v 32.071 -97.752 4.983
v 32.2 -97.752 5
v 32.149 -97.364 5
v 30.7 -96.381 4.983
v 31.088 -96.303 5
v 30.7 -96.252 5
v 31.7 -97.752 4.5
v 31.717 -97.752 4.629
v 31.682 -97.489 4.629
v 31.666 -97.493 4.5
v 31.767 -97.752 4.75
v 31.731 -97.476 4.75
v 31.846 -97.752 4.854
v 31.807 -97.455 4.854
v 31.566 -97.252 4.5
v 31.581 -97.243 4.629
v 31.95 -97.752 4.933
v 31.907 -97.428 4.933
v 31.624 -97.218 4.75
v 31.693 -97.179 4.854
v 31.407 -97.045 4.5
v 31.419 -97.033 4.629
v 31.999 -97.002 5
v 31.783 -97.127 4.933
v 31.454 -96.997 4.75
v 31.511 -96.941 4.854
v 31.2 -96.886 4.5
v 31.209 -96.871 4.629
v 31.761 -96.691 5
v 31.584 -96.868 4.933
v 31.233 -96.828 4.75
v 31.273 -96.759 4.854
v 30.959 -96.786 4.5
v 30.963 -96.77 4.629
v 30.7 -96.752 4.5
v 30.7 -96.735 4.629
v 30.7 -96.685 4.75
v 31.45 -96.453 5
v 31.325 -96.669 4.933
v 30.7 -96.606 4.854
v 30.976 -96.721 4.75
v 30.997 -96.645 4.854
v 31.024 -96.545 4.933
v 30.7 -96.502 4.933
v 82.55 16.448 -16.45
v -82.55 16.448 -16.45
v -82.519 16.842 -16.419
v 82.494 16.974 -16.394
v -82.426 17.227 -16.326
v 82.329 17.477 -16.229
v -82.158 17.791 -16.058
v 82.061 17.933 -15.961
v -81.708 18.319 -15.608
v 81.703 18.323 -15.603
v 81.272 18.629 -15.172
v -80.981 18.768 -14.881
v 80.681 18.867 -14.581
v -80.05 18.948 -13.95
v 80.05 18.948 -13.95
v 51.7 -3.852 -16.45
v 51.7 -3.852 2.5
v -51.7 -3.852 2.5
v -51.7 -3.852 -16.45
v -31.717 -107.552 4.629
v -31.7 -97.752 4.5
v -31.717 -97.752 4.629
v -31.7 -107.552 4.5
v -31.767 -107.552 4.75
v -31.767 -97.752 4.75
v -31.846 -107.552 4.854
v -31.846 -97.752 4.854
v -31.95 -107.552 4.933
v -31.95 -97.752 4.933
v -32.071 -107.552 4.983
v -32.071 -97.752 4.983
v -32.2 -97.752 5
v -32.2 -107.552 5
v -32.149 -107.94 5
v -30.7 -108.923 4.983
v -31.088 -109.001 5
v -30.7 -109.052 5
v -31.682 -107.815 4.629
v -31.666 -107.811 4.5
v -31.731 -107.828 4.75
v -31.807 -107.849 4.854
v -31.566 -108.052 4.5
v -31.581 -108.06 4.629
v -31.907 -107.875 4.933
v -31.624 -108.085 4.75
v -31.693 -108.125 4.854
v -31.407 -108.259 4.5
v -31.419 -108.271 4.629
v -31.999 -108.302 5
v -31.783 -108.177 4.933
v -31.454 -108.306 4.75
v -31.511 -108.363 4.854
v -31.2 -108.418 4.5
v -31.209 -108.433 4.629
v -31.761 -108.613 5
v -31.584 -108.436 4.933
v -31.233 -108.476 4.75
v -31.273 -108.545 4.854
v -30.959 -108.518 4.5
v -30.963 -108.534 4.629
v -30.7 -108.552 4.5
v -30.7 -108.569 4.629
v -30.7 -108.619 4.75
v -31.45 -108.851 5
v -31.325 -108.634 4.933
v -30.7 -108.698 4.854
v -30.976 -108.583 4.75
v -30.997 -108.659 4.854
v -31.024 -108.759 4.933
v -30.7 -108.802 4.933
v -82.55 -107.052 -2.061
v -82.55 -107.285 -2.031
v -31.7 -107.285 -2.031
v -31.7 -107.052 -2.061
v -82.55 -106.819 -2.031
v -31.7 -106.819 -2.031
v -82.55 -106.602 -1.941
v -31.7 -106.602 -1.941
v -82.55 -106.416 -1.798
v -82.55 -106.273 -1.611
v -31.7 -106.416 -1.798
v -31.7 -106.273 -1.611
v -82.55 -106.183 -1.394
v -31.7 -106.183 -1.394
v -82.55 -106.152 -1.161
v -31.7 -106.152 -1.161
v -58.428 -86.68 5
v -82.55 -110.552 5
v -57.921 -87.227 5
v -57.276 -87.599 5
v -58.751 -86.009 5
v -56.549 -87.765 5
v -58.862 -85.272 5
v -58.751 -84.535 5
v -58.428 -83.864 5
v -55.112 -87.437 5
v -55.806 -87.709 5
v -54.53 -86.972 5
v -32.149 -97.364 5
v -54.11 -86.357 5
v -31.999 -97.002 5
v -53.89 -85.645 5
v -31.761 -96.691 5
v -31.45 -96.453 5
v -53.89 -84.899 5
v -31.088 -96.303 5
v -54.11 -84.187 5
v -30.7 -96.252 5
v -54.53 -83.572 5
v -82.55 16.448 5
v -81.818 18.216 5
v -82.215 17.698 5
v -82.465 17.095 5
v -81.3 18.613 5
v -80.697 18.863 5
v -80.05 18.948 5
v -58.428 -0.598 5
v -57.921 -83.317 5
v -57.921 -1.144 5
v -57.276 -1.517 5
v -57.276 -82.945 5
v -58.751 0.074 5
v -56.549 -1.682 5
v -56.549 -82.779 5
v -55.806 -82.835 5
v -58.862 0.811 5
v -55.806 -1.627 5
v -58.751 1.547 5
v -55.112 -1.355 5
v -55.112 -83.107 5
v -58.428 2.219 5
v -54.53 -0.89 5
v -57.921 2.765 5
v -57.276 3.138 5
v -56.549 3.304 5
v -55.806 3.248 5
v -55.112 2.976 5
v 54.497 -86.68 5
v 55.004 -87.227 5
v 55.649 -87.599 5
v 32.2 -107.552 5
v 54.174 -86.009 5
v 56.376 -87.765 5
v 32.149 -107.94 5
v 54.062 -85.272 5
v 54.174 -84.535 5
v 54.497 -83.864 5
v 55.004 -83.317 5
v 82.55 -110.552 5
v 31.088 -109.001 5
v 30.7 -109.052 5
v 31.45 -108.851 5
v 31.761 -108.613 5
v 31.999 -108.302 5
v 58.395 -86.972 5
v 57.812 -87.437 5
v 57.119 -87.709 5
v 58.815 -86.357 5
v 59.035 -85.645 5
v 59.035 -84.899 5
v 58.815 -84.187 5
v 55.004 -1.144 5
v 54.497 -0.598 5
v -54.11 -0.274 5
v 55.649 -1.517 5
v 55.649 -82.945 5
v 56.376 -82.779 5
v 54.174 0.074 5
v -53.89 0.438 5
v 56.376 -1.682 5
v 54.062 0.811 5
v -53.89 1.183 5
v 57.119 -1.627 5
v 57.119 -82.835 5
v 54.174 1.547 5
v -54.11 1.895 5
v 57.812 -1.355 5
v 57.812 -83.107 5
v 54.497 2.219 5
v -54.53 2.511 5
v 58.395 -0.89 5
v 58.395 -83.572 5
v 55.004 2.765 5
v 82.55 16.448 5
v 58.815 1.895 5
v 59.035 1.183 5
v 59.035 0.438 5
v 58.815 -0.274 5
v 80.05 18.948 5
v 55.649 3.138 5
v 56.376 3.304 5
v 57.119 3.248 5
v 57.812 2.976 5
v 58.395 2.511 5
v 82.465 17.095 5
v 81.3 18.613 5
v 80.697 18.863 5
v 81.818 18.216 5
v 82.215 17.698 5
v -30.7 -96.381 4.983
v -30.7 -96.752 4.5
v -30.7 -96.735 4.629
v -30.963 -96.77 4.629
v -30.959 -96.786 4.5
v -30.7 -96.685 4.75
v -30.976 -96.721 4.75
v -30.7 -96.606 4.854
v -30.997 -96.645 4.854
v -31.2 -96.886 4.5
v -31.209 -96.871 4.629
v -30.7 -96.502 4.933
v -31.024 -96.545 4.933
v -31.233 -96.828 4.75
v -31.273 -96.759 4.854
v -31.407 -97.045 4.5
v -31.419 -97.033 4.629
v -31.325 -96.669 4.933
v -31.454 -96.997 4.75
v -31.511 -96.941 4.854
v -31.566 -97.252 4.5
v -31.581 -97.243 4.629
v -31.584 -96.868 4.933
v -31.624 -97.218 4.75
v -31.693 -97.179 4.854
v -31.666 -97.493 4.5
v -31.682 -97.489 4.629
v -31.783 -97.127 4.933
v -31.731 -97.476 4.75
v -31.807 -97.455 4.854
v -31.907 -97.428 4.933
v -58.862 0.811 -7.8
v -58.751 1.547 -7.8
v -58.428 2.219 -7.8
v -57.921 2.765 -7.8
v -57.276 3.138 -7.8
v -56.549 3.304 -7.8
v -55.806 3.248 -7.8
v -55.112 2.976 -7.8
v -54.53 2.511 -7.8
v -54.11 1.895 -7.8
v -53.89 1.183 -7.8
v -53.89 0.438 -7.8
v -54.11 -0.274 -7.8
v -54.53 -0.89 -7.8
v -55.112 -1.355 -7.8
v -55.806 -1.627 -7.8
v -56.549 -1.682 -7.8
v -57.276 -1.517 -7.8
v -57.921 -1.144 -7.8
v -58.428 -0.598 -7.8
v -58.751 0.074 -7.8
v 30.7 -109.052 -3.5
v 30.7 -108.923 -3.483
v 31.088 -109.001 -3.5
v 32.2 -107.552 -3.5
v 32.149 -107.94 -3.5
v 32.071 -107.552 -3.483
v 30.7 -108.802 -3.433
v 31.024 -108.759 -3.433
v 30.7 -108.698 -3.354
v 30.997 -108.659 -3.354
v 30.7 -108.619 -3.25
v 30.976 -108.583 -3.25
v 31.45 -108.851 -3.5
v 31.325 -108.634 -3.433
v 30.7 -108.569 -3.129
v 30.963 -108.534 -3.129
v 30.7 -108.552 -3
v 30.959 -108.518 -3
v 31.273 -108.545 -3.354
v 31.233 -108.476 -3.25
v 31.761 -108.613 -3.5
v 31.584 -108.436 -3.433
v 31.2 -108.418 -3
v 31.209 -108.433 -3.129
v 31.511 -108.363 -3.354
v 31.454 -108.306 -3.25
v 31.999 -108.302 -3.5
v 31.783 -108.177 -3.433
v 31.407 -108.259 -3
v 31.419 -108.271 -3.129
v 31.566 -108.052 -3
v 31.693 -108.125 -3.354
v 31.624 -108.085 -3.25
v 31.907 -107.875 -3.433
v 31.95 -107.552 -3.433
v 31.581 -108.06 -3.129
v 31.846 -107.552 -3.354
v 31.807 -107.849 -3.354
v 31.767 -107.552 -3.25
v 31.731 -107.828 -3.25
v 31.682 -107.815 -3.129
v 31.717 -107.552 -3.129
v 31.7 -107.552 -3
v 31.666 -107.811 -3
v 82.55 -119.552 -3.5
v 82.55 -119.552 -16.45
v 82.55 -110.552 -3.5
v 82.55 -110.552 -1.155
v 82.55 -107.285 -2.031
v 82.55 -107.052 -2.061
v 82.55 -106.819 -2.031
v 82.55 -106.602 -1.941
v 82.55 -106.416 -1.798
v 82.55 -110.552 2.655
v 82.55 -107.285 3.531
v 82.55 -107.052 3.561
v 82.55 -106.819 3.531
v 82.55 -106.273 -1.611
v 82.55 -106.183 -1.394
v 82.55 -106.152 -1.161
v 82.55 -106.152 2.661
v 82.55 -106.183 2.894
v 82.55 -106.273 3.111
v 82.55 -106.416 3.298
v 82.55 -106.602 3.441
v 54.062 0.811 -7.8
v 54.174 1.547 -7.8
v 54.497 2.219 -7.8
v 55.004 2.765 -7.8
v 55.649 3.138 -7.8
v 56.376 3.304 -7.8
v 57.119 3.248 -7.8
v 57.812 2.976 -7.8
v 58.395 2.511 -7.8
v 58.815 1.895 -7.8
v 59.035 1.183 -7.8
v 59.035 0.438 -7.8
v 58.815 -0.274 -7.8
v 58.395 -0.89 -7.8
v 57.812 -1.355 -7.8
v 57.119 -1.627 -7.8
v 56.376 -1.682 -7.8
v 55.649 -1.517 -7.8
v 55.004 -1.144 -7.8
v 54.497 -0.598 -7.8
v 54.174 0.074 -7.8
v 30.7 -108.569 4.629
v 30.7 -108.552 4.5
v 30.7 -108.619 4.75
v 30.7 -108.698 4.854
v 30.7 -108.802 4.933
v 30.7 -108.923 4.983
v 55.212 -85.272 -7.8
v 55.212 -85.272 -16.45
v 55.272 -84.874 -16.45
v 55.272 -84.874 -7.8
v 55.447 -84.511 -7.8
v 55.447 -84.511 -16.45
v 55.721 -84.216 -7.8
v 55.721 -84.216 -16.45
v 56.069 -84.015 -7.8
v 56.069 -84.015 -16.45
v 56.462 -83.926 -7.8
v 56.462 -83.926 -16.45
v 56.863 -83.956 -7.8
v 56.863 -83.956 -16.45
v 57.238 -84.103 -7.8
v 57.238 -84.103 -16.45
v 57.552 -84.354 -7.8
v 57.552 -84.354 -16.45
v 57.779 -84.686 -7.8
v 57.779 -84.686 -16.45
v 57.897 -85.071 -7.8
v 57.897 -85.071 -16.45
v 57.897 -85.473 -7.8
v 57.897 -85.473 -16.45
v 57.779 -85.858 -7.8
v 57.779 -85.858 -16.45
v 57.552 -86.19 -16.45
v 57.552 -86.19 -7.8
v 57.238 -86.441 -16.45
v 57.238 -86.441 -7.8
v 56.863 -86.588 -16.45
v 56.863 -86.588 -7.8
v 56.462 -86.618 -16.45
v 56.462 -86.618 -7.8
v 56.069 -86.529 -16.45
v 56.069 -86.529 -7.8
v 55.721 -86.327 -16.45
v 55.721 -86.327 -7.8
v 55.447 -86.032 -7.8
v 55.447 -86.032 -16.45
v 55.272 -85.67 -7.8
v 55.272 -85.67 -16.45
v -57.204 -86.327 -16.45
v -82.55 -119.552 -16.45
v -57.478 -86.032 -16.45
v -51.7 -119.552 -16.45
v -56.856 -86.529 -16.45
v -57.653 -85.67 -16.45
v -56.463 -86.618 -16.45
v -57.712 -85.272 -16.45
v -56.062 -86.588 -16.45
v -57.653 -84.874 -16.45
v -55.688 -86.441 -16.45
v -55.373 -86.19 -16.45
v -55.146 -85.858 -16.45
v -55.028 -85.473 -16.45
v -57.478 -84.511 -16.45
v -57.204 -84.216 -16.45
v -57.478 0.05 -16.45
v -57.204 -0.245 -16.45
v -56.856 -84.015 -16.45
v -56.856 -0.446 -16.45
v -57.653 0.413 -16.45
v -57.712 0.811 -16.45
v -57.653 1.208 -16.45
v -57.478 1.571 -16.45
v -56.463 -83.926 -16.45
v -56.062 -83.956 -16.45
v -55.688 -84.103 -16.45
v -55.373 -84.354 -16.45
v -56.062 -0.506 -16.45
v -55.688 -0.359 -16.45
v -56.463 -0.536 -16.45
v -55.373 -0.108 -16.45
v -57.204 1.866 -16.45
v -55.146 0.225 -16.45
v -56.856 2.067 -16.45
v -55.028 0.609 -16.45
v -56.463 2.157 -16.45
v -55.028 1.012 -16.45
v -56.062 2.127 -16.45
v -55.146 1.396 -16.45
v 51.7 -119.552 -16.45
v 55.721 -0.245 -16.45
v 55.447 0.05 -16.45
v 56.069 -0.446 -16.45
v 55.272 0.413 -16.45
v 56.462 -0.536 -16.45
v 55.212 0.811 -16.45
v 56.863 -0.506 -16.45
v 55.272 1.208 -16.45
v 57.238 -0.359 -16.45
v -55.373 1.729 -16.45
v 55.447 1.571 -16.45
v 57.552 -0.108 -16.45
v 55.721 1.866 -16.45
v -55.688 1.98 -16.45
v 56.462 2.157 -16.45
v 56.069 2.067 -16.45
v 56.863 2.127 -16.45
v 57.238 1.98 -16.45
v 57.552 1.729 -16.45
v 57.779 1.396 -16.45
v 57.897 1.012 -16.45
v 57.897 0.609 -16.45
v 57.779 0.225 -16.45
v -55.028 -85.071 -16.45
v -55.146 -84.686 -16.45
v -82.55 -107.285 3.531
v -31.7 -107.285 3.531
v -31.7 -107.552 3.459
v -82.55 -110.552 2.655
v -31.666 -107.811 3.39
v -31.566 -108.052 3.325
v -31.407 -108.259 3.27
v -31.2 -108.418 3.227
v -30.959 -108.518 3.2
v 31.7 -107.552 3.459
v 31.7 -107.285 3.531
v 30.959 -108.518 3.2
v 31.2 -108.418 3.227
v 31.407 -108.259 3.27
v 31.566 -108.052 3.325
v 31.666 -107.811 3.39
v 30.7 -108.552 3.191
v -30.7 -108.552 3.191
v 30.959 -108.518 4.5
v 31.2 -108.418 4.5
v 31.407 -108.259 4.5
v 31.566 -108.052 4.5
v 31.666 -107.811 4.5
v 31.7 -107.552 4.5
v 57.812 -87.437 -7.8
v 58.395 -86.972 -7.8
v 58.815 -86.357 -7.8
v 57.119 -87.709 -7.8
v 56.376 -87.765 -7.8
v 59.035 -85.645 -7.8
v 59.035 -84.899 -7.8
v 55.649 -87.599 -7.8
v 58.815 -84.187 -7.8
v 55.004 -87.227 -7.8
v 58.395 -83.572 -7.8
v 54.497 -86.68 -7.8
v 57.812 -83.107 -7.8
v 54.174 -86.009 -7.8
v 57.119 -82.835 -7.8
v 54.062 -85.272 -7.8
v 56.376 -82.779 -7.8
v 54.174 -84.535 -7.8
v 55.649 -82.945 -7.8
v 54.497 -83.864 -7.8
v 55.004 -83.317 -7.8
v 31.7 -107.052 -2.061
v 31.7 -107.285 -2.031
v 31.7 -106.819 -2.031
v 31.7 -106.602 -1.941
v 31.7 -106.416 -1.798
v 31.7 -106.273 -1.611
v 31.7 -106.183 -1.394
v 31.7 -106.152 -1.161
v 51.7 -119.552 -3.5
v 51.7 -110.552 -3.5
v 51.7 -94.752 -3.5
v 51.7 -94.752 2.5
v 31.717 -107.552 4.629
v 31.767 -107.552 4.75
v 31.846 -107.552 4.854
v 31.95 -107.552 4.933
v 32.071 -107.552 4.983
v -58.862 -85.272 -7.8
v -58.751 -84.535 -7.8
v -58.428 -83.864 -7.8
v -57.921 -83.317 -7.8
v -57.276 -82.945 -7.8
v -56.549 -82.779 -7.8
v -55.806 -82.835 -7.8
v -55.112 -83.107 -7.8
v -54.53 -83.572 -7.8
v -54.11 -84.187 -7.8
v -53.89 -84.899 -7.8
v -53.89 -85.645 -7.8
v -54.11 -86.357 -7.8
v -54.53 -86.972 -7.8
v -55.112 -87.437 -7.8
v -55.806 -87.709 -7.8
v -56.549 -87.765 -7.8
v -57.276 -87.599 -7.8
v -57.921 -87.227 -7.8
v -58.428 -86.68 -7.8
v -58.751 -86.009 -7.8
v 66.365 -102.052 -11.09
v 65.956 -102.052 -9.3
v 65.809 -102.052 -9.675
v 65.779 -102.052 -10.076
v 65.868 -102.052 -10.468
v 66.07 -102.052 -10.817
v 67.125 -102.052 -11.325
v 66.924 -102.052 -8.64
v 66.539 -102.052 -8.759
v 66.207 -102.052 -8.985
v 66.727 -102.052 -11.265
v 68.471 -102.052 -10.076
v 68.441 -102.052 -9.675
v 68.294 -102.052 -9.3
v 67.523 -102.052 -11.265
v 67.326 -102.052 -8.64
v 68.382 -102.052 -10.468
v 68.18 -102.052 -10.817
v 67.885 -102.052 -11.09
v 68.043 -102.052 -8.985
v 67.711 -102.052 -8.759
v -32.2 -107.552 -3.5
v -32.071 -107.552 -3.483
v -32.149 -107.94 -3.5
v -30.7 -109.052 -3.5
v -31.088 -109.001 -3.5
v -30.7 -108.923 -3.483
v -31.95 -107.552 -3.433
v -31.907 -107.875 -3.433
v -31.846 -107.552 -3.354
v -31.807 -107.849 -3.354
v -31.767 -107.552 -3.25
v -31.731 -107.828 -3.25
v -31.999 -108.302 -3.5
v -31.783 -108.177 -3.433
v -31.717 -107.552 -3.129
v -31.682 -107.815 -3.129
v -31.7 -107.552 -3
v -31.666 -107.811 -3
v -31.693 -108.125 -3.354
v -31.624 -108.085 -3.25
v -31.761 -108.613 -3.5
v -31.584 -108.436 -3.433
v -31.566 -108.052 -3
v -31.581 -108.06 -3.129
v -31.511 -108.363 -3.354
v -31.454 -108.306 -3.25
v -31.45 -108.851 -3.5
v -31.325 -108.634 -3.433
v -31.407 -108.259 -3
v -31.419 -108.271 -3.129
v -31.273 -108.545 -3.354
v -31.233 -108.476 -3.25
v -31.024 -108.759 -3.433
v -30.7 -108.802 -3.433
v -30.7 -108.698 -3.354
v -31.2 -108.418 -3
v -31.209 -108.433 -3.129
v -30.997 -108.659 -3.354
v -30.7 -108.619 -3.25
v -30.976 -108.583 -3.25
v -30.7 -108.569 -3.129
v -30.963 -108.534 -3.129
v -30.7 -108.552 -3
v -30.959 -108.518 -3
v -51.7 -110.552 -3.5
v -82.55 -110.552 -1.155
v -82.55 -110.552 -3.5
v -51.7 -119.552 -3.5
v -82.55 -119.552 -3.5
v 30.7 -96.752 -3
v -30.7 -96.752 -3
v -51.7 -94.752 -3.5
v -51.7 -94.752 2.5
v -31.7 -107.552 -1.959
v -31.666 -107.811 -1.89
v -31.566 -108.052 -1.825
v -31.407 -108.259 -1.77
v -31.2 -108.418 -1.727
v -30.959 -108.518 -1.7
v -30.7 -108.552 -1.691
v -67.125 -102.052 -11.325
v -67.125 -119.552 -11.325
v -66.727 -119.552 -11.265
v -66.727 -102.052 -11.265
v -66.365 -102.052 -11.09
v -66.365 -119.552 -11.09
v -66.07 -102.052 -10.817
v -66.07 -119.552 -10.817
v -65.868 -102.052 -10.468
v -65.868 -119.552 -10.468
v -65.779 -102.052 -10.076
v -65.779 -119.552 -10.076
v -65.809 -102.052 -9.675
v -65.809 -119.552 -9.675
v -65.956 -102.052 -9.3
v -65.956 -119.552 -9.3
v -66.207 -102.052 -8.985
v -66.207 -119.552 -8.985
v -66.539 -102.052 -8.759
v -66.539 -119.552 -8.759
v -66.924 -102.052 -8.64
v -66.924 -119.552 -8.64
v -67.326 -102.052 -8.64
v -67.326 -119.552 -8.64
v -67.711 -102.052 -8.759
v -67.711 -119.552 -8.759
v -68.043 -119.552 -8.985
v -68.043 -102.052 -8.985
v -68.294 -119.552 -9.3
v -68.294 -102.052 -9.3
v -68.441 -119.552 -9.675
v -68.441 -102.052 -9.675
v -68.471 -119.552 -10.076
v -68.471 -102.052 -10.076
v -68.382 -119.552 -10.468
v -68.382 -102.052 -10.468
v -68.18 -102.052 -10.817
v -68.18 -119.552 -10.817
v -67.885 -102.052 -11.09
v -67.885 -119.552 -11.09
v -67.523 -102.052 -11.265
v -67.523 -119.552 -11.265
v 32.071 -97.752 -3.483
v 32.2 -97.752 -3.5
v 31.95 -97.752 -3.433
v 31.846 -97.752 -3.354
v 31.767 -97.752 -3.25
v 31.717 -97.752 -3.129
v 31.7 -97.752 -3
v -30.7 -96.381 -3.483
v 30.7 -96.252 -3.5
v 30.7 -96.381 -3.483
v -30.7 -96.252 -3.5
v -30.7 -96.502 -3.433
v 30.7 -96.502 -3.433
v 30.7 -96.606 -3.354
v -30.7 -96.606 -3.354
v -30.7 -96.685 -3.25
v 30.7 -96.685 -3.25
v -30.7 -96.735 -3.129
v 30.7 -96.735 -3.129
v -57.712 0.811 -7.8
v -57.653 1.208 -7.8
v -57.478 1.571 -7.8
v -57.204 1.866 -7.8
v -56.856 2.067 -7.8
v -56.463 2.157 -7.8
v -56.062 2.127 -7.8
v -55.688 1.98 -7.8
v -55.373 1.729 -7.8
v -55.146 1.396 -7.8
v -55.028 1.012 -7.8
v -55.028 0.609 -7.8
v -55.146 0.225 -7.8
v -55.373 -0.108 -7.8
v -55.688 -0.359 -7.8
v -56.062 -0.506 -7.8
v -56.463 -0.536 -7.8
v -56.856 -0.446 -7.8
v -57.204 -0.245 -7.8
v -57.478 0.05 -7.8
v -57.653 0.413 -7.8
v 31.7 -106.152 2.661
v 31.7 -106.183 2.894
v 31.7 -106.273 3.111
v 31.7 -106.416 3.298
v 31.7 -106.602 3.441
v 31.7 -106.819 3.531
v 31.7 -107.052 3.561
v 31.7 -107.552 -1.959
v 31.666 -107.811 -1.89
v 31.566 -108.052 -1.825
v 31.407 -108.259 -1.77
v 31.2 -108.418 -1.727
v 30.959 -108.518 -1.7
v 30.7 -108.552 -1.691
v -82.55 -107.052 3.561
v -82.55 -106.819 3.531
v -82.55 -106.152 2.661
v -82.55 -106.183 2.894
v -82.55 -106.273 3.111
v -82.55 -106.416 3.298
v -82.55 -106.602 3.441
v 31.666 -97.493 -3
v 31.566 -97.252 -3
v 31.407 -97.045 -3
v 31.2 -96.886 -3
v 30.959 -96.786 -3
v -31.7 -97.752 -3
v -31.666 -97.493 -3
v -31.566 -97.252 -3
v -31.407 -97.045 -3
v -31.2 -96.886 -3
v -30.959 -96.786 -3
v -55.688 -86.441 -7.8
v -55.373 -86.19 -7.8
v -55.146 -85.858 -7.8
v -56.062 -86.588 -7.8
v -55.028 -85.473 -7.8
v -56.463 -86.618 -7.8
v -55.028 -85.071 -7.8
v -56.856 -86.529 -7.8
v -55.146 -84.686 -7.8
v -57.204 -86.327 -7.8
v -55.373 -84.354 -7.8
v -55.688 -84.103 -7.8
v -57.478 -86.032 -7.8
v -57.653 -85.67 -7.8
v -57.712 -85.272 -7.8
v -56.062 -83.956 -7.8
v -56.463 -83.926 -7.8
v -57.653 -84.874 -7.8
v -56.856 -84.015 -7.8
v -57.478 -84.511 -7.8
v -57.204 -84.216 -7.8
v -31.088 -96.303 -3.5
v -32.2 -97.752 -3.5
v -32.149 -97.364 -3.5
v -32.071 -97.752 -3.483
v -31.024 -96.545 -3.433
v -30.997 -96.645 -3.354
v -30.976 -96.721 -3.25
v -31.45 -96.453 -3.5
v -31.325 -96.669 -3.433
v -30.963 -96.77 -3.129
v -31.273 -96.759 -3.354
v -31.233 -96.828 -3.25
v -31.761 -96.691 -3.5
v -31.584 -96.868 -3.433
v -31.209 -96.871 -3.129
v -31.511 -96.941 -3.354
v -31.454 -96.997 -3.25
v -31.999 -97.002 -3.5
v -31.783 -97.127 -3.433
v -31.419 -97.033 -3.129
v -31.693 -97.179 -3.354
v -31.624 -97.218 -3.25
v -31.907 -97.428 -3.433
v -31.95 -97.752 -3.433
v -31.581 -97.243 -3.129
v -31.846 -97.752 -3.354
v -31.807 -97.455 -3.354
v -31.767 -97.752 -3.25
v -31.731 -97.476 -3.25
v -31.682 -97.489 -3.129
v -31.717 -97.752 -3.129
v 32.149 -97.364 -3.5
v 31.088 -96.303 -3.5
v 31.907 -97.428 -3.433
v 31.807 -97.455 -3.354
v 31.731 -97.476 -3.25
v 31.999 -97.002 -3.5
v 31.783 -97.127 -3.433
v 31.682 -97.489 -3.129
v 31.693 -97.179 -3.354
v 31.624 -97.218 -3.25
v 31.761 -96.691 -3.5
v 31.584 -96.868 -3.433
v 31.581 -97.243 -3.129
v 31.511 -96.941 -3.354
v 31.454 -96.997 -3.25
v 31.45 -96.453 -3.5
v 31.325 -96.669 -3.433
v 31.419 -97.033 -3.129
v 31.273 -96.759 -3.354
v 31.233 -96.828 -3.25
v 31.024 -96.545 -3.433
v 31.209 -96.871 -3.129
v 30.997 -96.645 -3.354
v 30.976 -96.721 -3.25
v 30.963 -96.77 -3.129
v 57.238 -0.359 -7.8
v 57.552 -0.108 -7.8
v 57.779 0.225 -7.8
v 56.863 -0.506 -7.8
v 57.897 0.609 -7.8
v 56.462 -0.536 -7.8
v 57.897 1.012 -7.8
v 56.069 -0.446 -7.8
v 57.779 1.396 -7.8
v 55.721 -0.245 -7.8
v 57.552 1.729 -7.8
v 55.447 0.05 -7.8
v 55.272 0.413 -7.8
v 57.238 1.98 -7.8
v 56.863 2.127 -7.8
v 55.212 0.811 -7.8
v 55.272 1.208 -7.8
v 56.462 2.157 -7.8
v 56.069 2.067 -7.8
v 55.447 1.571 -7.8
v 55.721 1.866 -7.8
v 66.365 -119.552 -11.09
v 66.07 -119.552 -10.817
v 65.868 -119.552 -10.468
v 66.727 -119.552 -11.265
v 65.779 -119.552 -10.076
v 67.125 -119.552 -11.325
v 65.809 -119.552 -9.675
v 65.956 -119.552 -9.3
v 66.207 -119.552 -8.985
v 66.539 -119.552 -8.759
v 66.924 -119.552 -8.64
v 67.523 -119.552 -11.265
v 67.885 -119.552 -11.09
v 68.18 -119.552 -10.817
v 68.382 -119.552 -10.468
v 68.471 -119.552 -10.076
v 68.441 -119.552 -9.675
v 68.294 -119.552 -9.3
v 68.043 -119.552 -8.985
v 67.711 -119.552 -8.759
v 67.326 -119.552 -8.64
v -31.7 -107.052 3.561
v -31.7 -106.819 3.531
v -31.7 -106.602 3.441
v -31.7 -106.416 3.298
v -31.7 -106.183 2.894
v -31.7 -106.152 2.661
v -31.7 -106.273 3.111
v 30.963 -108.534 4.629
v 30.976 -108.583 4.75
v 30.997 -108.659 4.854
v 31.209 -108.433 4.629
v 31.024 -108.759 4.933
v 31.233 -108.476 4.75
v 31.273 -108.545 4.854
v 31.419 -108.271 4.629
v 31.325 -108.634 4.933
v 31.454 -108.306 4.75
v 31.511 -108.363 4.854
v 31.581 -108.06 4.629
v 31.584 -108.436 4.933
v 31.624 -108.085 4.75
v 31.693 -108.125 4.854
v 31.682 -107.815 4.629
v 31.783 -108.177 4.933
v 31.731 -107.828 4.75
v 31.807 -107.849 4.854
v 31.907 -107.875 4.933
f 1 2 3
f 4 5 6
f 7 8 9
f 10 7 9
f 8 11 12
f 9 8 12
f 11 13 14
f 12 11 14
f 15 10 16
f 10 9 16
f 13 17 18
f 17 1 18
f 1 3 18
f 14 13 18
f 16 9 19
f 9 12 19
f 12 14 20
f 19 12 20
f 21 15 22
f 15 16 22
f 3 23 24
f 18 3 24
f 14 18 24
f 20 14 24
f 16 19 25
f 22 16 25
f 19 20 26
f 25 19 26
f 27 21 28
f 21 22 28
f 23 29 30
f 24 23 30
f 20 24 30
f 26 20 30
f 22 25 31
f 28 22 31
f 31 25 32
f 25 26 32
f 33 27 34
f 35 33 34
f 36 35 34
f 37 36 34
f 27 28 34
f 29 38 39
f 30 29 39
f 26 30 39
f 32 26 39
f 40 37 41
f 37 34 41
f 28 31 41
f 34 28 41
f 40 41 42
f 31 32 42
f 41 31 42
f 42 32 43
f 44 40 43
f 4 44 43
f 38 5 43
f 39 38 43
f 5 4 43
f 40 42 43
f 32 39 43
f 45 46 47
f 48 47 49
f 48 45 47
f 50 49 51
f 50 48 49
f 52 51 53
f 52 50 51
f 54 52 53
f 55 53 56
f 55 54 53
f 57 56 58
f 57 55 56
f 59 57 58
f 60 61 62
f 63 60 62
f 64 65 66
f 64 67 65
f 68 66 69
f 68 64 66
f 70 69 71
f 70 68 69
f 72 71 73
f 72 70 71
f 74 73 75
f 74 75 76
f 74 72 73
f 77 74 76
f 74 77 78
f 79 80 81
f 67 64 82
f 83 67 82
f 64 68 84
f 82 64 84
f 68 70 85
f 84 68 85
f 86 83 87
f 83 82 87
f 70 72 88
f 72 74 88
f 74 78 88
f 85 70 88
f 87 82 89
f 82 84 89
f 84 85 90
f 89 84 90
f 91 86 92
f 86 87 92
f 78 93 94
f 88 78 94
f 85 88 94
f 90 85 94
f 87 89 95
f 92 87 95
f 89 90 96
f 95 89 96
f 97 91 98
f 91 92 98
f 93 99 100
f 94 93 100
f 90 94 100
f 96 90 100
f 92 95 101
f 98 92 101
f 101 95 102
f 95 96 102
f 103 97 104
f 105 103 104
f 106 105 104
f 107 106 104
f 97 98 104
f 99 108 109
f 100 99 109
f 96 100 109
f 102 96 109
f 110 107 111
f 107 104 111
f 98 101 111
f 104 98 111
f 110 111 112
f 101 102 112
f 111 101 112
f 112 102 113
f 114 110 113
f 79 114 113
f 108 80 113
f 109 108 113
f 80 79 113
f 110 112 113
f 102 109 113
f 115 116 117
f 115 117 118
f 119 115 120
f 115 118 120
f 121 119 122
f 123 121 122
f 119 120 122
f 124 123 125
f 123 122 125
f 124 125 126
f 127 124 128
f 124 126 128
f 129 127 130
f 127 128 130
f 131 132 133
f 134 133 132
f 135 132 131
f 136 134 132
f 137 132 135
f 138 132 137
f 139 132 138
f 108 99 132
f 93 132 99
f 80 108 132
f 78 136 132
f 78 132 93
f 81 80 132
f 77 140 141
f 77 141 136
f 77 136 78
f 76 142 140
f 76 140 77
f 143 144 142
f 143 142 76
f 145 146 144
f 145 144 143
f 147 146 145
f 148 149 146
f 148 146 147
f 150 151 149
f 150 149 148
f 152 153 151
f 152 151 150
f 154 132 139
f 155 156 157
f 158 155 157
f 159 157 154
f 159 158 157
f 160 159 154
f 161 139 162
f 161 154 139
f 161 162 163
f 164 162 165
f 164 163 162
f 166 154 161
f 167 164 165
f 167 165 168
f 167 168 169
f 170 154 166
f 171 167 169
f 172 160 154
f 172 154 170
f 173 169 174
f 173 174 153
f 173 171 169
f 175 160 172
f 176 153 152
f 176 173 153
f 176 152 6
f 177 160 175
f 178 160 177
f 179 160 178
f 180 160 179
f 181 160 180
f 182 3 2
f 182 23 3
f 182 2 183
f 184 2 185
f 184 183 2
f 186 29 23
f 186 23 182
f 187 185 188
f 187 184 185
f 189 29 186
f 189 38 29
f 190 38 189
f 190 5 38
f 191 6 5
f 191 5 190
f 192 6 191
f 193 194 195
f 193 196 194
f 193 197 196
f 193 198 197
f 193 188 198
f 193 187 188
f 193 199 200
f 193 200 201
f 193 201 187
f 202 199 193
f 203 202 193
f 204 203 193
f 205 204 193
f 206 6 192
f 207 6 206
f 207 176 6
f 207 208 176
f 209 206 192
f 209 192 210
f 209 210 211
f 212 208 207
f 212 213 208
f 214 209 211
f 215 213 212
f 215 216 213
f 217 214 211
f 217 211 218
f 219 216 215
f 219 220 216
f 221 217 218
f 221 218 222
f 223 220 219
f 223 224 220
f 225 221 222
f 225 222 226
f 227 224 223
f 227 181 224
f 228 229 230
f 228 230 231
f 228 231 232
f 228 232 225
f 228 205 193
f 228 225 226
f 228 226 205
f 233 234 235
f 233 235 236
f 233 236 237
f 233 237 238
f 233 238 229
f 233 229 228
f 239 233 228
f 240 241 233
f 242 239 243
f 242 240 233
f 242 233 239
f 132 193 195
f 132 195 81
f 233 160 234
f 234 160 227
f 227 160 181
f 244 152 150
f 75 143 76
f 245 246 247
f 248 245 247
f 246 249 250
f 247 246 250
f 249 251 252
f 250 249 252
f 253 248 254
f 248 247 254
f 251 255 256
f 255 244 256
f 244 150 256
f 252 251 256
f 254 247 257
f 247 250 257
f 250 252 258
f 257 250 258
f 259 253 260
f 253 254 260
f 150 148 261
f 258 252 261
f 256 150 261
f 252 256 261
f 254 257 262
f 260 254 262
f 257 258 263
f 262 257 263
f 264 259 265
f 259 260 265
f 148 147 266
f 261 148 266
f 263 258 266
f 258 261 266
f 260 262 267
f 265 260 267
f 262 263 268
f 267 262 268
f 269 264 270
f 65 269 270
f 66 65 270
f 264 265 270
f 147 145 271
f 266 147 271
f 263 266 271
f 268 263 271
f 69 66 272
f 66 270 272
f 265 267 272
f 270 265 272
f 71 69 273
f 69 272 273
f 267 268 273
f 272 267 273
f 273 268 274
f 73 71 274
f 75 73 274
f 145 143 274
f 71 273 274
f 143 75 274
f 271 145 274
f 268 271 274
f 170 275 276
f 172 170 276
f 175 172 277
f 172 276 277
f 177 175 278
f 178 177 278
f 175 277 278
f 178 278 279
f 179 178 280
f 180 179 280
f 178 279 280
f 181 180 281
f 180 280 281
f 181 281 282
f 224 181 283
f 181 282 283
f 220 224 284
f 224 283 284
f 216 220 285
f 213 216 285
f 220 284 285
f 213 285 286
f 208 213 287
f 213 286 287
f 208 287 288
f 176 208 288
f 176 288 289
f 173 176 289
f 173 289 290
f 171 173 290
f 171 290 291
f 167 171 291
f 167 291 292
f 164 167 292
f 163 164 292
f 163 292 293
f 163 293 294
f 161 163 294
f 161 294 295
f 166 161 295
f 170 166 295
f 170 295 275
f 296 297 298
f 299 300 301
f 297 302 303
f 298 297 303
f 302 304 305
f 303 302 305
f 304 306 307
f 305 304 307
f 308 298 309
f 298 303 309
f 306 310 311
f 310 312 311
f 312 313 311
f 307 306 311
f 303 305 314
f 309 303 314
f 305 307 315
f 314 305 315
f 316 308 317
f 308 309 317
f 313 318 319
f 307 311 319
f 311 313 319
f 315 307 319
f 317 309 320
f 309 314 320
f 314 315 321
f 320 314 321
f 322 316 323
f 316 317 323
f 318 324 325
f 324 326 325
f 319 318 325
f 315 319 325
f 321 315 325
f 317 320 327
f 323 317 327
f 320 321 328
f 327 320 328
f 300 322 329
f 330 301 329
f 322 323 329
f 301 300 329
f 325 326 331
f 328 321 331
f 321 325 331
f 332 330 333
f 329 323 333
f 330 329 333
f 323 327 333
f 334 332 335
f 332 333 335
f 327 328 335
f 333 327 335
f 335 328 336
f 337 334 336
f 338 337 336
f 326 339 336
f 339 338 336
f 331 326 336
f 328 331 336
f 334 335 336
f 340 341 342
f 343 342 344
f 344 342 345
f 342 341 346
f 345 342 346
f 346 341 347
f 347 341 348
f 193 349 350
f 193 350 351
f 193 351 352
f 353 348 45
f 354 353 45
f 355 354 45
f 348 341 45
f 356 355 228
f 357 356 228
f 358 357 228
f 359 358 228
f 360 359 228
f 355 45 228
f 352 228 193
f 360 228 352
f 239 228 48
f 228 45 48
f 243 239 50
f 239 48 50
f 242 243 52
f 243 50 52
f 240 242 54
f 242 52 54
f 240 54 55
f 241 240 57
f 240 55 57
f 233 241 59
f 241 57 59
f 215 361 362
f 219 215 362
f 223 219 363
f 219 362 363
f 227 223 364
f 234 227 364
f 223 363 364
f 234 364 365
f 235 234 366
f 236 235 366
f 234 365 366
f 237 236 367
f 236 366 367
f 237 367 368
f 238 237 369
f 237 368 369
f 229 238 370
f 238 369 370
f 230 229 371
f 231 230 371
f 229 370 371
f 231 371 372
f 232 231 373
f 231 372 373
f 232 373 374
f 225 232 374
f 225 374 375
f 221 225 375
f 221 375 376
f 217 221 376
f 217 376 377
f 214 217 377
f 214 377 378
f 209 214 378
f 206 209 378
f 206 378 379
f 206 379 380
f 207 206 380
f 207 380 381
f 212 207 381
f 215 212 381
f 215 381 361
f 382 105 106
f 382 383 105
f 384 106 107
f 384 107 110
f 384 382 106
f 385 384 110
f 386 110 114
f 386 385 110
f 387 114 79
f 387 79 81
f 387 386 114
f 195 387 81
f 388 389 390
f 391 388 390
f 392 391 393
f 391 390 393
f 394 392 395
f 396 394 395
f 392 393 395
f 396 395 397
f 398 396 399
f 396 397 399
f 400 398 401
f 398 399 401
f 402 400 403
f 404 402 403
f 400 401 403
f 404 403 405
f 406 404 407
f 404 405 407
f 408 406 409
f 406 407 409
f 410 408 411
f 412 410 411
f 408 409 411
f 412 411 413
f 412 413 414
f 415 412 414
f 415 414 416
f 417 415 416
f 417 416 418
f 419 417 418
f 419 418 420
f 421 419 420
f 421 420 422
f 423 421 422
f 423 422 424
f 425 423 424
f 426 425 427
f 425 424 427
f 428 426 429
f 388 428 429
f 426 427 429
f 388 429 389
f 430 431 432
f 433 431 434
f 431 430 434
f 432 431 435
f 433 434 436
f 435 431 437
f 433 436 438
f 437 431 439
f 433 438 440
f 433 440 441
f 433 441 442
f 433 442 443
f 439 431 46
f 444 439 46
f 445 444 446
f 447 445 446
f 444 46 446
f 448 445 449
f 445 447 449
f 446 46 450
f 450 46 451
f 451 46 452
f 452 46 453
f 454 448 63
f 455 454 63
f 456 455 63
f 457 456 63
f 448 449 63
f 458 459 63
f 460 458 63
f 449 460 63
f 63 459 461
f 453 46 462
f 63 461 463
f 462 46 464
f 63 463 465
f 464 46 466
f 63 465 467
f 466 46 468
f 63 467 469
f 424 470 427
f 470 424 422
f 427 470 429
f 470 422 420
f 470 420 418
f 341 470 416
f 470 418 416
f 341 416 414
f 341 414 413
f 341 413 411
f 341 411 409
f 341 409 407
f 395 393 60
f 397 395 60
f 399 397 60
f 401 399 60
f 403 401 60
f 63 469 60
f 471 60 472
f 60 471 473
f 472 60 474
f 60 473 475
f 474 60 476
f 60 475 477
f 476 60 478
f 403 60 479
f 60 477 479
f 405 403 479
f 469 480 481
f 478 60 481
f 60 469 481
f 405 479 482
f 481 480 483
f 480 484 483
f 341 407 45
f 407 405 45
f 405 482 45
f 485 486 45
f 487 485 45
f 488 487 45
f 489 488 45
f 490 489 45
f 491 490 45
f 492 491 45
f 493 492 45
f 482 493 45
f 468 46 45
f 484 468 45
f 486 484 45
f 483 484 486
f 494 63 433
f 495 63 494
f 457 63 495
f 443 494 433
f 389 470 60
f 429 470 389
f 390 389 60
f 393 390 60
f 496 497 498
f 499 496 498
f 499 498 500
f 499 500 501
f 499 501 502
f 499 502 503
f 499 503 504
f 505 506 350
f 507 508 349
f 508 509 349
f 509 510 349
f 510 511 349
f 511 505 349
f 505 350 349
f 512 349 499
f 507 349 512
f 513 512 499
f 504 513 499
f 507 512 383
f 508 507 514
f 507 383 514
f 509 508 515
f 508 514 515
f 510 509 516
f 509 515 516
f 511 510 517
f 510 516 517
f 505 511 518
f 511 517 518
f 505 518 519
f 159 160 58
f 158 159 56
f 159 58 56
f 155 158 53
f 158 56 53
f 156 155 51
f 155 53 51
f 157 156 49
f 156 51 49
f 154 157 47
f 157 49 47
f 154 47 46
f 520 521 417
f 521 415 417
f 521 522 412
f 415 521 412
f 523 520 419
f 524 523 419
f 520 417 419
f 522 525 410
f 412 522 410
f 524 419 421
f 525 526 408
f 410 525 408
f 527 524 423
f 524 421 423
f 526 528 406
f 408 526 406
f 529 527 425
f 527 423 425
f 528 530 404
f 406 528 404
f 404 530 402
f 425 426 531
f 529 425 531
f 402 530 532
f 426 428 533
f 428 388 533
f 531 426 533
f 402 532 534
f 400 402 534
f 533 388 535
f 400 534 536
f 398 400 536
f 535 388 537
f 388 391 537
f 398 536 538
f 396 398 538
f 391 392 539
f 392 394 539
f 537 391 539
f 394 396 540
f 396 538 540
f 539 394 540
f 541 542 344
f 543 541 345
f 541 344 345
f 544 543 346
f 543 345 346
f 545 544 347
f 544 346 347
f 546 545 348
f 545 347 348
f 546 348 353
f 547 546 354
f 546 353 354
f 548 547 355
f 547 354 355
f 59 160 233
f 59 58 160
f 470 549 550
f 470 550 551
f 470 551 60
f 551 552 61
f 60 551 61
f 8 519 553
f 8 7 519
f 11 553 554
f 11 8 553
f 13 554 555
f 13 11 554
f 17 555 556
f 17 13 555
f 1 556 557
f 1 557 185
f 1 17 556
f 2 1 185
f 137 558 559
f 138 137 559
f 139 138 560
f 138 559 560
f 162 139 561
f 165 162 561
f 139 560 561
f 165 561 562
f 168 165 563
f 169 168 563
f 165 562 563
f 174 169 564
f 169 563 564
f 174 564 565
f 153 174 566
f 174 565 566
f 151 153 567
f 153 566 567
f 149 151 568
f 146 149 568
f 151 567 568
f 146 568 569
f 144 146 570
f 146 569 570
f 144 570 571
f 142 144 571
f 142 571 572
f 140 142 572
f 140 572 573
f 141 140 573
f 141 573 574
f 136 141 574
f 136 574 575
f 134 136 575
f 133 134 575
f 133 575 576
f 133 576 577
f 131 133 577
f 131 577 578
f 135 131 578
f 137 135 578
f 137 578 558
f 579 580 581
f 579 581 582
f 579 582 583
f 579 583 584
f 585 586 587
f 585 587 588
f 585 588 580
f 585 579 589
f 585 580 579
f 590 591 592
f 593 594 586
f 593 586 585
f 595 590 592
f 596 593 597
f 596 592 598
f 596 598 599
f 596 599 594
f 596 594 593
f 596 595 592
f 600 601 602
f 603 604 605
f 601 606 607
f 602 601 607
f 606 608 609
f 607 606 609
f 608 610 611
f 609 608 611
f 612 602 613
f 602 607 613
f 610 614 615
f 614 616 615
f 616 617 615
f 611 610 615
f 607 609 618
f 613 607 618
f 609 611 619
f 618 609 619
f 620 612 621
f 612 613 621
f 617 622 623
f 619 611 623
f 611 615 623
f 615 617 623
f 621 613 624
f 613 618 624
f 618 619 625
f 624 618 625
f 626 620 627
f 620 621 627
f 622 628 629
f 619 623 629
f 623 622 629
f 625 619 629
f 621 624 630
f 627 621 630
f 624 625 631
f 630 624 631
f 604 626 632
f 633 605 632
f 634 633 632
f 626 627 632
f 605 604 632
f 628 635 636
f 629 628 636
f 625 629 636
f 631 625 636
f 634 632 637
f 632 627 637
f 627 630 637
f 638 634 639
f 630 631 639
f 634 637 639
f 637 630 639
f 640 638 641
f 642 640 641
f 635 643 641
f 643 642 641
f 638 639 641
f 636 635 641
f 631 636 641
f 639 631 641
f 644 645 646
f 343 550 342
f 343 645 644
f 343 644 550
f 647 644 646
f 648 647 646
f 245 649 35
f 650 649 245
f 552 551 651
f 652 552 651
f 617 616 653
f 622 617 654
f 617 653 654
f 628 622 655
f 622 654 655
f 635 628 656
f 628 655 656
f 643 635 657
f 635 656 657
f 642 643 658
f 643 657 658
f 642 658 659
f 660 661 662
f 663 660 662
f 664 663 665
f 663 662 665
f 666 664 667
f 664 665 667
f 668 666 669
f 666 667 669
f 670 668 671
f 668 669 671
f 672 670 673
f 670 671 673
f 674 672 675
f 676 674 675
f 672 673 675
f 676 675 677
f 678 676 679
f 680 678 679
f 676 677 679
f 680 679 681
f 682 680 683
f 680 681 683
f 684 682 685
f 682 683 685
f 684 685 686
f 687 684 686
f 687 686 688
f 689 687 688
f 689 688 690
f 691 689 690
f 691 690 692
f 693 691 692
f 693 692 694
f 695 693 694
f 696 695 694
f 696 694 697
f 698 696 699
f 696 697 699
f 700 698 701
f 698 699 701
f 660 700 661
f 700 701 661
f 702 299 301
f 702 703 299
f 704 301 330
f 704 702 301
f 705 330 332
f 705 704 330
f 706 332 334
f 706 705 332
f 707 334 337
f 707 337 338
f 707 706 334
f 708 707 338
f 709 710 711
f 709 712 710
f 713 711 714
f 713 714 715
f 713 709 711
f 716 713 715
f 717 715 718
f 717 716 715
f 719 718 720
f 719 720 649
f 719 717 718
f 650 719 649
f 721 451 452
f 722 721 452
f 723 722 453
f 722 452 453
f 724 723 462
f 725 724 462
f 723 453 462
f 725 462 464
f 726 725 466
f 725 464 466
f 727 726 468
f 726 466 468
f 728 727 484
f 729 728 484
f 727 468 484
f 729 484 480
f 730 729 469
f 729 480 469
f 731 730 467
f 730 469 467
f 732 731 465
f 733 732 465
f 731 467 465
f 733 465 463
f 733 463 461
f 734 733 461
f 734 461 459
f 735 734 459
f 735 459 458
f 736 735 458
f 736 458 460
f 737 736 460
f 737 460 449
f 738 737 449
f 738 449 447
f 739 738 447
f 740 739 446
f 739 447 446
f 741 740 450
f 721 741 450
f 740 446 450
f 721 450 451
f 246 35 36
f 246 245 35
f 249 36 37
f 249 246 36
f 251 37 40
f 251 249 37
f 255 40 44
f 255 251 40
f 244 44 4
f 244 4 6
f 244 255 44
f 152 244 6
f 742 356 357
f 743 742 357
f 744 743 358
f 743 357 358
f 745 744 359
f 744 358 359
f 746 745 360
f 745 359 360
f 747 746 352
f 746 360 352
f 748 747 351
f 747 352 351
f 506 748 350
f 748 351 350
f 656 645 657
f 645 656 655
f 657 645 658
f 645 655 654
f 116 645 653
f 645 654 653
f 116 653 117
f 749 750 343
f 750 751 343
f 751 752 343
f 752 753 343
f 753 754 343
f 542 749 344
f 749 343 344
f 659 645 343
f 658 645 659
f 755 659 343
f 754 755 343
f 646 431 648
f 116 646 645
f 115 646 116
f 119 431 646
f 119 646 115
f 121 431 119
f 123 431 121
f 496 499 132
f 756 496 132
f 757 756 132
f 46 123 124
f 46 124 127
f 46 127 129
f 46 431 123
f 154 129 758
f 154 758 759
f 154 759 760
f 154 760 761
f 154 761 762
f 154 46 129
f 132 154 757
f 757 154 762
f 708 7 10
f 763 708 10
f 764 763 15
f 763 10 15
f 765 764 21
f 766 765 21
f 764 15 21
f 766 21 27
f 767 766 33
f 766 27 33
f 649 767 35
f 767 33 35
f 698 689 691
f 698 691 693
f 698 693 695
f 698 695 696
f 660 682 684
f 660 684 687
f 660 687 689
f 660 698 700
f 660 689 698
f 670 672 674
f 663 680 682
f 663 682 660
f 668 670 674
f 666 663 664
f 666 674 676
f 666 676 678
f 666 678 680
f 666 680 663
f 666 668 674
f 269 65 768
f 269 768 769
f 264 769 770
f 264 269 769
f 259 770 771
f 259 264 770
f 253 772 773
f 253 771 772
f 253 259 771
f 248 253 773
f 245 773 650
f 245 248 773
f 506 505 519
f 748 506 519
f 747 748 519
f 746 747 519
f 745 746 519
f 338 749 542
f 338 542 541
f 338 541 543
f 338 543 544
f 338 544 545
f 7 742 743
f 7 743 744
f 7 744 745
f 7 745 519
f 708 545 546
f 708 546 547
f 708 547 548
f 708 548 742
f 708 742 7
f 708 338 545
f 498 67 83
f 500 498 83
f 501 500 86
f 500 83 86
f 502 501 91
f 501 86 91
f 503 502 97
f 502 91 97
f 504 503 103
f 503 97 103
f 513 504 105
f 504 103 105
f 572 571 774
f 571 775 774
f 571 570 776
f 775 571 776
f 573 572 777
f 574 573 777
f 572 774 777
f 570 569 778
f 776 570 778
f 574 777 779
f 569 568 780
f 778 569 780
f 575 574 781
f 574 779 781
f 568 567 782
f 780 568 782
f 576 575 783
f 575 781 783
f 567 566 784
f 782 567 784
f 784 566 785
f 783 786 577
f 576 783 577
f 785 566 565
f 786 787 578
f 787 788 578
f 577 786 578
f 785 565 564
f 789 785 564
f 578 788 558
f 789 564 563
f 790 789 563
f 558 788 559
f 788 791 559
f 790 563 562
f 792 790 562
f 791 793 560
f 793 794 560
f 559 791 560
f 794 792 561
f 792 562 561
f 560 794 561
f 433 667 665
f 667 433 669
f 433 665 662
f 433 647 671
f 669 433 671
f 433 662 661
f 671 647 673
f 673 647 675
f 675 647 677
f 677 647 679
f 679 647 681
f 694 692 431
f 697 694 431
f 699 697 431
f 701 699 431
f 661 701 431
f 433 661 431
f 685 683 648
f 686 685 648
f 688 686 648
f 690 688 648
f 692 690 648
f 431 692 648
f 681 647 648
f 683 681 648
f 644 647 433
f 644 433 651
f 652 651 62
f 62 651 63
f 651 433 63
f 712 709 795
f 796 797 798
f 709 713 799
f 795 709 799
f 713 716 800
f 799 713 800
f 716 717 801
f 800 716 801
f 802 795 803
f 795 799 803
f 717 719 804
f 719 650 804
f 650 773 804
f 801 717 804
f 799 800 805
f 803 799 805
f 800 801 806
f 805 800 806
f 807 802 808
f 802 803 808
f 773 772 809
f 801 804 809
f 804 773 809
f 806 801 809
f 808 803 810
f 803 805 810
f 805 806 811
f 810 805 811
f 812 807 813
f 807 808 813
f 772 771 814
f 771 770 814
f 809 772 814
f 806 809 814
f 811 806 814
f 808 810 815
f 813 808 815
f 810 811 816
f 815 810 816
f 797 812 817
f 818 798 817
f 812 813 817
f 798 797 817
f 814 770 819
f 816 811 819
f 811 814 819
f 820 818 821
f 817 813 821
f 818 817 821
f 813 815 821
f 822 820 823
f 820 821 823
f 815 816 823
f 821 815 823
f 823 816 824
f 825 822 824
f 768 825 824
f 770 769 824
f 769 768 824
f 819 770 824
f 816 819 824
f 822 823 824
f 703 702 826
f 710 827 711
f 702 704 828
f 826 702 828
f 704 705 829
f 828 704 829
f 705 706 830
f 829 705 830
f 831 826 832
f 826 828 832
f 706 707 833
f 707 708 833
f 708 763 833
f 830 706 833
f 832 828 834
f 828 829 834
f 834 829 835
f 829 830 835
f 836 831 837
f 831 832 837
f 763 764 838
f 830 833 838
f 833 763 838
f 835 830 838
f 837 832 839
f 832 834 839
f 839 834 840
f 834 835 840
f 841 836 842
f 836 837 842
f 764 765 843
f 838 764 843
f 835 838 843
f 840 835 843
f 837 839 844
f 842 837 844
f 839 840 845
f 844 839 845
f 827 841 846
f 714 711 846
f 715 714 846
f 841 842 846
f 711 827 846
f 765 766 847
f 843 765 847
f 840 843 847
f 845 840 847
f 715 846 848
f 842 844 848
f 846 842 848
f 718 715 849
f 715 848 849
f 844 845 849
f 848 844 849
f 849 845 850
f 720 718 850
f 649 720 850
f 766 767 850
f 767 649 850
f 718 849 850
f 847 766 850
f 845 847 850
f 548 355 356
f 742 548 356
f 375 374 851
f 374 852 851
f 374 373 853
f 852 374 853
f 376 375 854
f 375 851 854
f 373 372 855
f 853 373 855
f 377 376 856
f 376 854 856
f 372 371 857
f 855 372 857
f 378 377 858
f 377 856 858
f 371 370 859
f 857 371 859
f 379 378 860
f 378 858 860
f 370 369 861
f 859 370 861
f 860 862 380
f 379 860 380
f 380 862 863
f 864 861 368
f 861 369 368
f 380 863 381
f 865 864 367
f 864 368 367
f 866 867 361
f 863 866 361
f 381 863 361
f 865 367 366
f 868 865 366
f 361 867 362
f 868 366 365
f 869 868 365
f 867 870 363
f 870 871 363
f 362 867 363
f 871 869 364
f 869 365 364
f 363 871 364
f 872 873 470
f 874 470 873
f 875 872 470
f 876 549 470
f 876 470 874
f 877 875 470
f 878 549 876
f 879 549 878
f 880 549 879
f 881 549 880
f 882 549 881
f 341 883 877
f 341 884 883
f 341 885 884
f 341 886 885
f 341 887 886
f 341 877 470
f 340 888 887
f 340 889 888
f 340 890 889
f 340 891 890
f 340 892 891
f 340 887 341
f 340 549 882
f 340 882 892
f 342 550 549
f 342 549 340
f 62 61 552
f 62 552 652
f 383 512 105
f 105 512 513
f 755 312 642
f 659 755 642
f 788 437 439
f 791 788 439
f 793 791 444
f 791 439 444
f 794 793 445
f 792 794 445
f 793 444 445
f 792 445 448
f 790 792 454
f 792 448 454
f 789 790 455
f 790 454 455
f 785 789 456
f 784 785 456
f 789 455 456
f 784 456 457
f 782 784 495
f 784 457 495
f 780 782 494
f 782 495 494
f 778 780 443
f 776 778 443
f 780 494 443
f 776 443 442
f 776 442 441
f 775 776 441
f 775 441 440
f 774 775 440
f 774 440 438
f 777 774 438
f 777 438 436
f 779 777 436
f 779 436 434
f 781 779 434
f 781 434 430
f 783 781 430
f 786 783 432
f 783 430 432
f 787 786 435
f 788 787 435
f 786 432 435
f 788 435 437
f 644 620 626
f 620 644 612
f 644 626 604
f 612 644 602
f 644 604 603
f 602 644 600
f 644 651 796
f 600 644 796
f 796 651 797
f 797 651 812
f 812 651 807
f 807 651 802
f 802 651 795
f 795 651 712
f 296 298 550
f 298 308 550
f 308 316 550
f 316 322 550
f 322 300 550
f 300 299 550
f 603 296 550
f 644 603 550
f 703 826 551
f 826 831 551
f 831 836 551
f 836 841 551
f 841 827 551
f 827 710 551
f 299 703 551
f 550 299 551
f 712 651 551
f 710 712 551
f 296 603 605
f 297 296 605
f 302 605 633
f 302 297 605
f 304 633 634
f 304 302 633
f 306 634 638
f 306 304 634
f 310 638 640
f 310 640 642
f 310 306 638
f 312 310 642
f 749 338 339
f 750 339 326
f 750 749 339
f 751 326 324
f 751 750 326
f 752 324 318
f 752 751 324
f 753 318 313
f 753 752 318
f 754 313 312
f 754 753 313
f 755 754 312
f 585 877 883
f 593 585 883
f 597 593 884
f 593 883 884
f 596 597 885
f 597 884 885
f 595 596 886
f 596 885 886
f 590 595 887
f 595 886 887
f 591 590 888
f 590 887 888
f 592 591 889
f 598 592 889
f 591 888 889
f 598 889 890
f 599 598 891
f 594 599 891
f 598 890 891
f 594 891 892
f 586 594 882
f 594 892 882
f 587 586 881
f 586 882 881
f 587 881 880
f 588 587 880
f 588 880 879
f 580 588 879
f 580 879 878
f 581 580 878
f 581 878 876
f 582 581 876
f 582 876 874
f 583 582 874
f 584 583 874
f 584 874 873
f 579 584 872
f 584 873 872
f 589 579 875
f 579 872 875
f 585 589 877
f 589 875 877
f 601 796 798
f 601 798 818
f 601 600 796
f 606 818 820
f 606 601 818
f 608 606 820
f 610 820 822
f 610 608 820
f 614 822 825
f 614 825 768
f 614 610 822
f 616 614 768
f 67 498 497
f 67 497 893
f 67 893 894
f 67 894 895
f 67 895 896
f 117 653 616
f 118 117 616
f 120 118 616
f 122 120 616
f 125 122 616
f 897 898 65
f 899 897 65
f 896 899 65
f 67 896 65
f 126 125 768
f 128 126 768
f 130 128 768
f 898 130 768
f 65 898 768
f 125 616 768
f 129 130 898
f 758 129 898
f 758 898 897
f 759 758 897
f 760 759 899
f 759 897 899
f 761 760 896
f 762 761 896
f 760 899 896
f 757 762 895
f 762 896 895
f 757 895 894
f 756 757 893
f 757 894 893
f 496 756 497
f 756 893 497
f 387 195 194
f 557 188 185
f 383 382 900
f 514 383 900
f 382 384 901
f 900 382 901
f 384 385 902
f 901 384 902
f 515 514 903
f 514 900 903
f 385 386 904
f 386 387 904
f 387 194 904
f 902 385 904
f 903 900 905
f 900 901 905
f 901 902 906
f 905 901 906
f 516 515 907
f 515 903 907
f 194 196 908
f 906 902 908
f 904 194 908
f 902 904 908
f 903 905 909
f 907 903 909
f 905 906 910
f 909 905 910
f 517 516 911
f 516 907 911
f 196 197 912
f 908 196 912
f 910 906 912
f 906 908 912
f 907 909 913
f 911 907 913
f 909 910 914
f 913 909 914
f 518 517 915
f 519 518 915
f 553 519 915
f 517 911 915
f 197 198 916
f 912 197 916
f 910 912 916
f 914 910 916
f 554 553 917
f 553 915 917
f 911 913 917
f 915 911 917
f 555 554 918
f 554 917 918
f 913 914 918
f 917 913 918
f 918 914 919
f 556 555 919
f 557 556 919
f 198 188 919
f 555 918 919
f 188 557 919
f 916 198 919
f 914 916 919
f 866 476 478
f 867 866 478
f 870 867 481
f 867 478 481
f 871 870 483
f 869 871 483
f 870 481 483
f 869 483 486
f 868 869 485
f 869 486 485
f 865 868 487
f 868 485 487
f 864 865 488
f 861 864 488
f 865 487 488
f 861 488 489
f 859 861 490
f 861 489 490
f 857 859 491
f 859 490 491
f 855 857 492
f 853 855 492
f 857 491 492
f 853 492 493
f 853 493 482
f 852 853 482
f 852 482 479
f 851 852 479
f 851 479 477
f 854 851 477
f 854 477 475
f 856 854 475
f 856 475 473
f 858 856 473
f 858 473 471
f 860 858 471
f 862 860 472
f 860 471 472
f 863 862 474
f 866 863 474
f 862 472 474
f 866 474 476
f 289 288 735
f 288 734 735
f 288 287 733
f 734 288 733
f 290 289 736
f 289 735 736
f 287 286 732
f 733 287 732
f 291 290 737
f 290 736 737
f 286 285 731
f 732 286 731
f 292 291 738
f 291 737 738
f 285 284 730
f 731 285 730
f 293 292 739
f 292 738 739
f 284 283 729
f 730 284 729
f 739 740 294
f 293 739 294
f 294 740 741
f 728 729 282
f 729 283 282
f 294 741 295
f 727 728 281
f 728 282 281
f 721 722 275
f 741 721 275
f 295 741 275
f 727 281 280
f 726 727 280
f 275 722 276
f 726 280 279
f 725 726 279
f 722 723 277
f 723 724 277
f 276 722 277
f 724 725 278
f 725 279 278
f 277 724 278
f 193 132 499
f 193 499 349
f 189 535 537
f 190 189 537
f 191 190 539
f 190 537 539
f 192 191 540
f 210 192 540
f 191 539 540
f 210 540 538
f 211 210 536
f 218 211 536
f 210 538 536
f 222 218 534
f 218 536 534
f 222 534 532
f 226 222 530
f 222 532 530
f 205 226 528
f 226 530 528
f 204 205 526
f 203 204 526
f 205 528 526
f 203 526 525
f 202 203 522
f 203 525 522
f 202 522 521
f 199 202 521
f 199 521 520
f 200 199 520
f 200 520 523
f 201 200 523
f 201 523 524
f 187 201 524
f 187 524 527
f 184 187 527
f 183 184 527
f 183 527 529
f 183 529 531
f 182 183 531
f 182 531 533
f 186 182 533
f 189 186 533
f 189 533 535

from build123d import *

# Parameters (mm, degrees)
SKETCH1_W           = 165.1
SKETCH1_H           = 100
BOSS_EXTRUDE1_DEPTH = 5
SKETCH4_W           = 165.1
SKETCH4_H           = 100
BOSS_EXTRUDE2_DEPTH = 3.5
SKETCH10_W          = 165.1
SKETCH10_H          = 8.5
BOSS_EXTRUDE4_DEPTH = 17
SKETCH11_W          = 103.4
SKETCH11_H          = 90.9
CUT_EXTRUDE6_DEPTH  = 6
SKETCH12_W          = 165.1
SKETCH12_H          = 13.05
BOSS_EXTRUDE5_DEPTH = 12.95
SKETCH13_W          = 165.1
SKETCH13_H          = 21.45
BOSS_EXTRUDE6_DEPTH = 9.75
SKETCH14_W          = 30.85
SKETCH14_H          = 115.7
BOSS_EXTRUDE7_DEPTH = 12.95
SKETCH15_R          = 1.35
CUT_EXTRUDE7_DEPTH  = 8.65
SKETCH16_R          = 2.5
CUT_EXTRUDE8_DEPTH  = 146.84584686
FILLET1_R           = 2.5
SKETCH17_W          = 165.1
SKETCH17_H          = 8.5
BOSS_EXTRUDE9_DEPTH = 2.75
CUT_EXTRUDE9_DEPTH  = 205.50252088
SKETCH21_R          = 1.35
CUT_EXTRUDE10_DEPTH = 17.5
SKETCH22_W          = 63.4
SKETCH22_H          = 11.8
CUT_EXTRUDE11_DEPTH = 10
FILLET2_R           = 1
FILLET3_R           = 0.5


with BuildPart() as part:
    # Sketch1 → Boss-Extrude1 (new body)
    with BuildSketch(Plane.XY):
        with Locations((0, -40.801949153)):
            Rectangle(SKETCH1_W, SKETCH1_H)
    extrude(amount=BOSS_EXTRUDE1_DEPTH)

    # Sketch4 → Boss-Extrude2 (add)
    with BuildSketch(Plane(origin=(0, 0, 0), x_dir=(-1, 0, 0), z_dir=(0, 0, -1))):
        with Locations((0, -40.801949153)):
            Rectangle(SKETCH4_W, SKETCH4_H)
    extrude(amount=BOSS_EXTRUDE2_DEPTH)

    # Sketch10 → Boss-Extrude4 (add)
    with BuildSketch(Plane.XZ.offset(90.801949153)):
        with Locations((0, 0.75)):
            Rectangle(SKETCH10_W, SKETCH10_H)
    extrude(amount=BOSS_EXTRUDE4_DEPTH)

    # Sketch11 → Cut-Extrude6 (cut)
    with BuildSketch(Plane(origin=(0, 0, -3.5), x_dir=(-1, 0, 0), z_dir=(0, 0, -1))):
        with Locations((0, -49.301949153)):
            Rectangle(SKETCH11_W, SKETCH11_H)
    extrude(amount=-CUT_EXTRUDE6_DEPTH, mode=Mode.SUBTRACT)

    # Sketch12 → Boss-Extrude5 (add)
    with BuildSketch(Plane(origin=(0, 0, -3.5), x_dir=(-1, 0, 0), z_dir=(0, 0, -1))):
        with Locations((0, 2.673050847)):
            Rectangle(SKETCH12_W, SKETCH12_H)
    extrude(amount=BOSS_EXTRUDE5_DEPTH)

    # Sketch13 → Boss-Extrude6 (add)
    with BuildSketch(Plane(origin=(0, 9.198050847, 0), x_dir=(1, 0, 0), z_dir=(0, 1, 0))):
        with Locations((0, 5.725)):
            Rectangle(SKETCH13_W, SKETCH13_H)
    extrude(amount=BOSS_EXTRUDE6_DEPTH)

    # Sketch14 → Boss-Extrude7 (add)
    with BuildSketch(Plane(origin=(0, 0, -3.5), x_dir=(-1, 0, 0), z_dir=(0, 0, -1))):
        Polygon((-51.7, -106.501949153), (-51.7, -119.551949153), (-82.55, -119.551949153), (-82.55, -3.851949153), (-51.7, -3.851949153), align=None)
        with Locations((67.125, -61.701949153)):
            Rectangle(SKETCH14_W, SKETCH14_H)
    extrude(amount=BOSS_EXTRUDE7_DEPTH)

    # Sketch15 → Cut-Extrude7 (cut)
    with BuildSketch(Plane(origin=(0, 0, -16.45), x_dir=(-1, 0, 0), z_dir=(0, 0, -1))):
        with Locations((56.3625, -85.271949153)):
            Circle(SKETCH15_R)
        with Locations((56.3625, 0.810550847)):
            Circle(SKETCH15_R)
        with Locations((-56.5625, 0.810550847)):
            Circle(SKETCH15_R)
        with Locations((-56.5625, -85.271949153)):
            Circle(SKETCH15_R)
    extrude(amount=-CUT_EXTRUDE7_DEPTH, mode=Mode.SUBTRACT)

    # Sketch16 → Cut-Extrude8 (cut, through all)
    with BuildSketch(Plane(origin=(0, 0, -7.8), x_dir=(-1, 0, 0), z_dir=(0, 0, -1))):
        with Locations((56.3625, 0.810550847)):
            Circle(SKETCH16_R)
        with Locations((-56.5625, 0.810550847)):
            Circle(SKETCH16_R)
        with Locations((-56.5625, -85.271949153)):
            Circle(SKETCH16_R)
        with Locations((56.3625, -85.271949153)):
            Circle(SKETCH16_R)
    extrude(amount=-CUT_EXTRUDE8_DEPTH, mode=Mode.SUBTRACT)

    # Fillet1
    fillet1_edges = [part.edges().sort_by_distance(p)[0] for p in [
        (-82.55, 18.948050847, -5.725),
        (82.55, 18.948050847, -5.725),
        (0, 18.948050847, -16.45),
    ]]
    fillet(fillet1_edges, radius=FILLET1_R)

    # Sketch17 → Boss-Extrude9 (add)
    with BuildSketch(Plane.XZ.offset(107.801949153)):
        with Locations((0, 0.75)):
            Rectangle(SKETCH17_W, SKETCH17_H)
    extrude(amount=BOSS_EXTRUDE9_DEPTH)

    # Sketch20 → Cut-Extrude9 (cut, through all)
    with BuildSketch(Plane(origin=(82.55, 0, 0), x_dir=(0, 0, -1), z_dir=(1, 0, 0))):
        with BuildLine():
            Line((1.155291427, -110.551949153), (2.030698282, -107.284886293))
            ThreePointArc((2.030698282, -107.284886293), (1.875383044, -106.504063866), (1.161365038, -106.151949153))
            Line((1.161365038, -106.151949153), (-2.661365038, -106.151949153))
            ThreePointArc((-2.661365038, -106.151949153), (-3.375383044, -106.504063866), (-3.530698282, -107.284886293))
            Line((-3.530698282, -107.284886293), (-2.655291427, -110.551949153))
            Line((-2.655291427, -110.551949153), (1.155291427, -110.551949153))
        make_face()
    extrude(amount=-CUT_EXTRUDE9_DEPTH, mode=Mode.SUBTRACT)

    # Sketch21 → Cut-Extrude10 (cut)
    with BuildSketch(Plane.XZ.offset(119.551949153)):
        with Locations(Location((-67.125, -9.975, 0), (0, 0, 270))):
            Circle(SKETCH21_R)
        with Locations(Location((67.125, -9.975, 0), (0, 0, 270))):
            Circle(SKETCH21_R)
    extrude(amount=-CUT_EXTRUDE10_DEPTH, mode=Mode.SUBTRACT)

    # Sketch22 → Cut-Extrude11 (cut)
    with BuildSketch(Plane(origin=(0, 0, -3.5), x_dir=(-1, 0, 0), z_dir=(0, 0, -1))):
        with Locations((0, -102.651949153)):
            Rectangle(SKETCH22_W, SKETCH22_H)
    extrude(amount=-CUT_EXTRUDE11_DEPTH, mode=Mode.SUBTRACT)

    # Fillet2
    fillet2_edges = [part.edges().sort_by_distance(p)[0] for p in [
        (31.7, -96.751949153, 0.75),
        (-31.7, -108.551949153, 4.095594906),
        (-31.7, -108.551949153, -2.595594906),
        (31.7, -108.551949153, 4.095594906),
        (31.7, -108.551949153, -2.595594906),
        (-31.7, -96.751949153, 0.75),
    ]]
    fillet(fillet2_edges, radius=FILLET2_R)

    # Fillet3
    fillet3_edges = [part.edges().sort_by_distance(p)[0] for p in [
        (31.407106781, -108.259055934, 5),
        (31.7, -102.651949153, 5),
        (31.407106781, -97.044842371, 5),
        (31.407106781, -97.044842371, -3.5),
        (0, -96.751949153, 5),
        (0, -96.751949153, -3.5),
        (-31.407106781, -97.044842371, 5),
        (-31.407106781, -97.044842371, -3.5),
        (-31.7, -102.651949153, 5),
        (-31.407106781, -108.259055934, 5),
        (0, -108.551949153, 5),
        (-31.407106781, -108.259055934, -3.5),
        (31.407106781, -108.259055934, -3.5),
    ]]
    fillet(fillet3_edges, radius=FILLET3_R)


solid = part.part
